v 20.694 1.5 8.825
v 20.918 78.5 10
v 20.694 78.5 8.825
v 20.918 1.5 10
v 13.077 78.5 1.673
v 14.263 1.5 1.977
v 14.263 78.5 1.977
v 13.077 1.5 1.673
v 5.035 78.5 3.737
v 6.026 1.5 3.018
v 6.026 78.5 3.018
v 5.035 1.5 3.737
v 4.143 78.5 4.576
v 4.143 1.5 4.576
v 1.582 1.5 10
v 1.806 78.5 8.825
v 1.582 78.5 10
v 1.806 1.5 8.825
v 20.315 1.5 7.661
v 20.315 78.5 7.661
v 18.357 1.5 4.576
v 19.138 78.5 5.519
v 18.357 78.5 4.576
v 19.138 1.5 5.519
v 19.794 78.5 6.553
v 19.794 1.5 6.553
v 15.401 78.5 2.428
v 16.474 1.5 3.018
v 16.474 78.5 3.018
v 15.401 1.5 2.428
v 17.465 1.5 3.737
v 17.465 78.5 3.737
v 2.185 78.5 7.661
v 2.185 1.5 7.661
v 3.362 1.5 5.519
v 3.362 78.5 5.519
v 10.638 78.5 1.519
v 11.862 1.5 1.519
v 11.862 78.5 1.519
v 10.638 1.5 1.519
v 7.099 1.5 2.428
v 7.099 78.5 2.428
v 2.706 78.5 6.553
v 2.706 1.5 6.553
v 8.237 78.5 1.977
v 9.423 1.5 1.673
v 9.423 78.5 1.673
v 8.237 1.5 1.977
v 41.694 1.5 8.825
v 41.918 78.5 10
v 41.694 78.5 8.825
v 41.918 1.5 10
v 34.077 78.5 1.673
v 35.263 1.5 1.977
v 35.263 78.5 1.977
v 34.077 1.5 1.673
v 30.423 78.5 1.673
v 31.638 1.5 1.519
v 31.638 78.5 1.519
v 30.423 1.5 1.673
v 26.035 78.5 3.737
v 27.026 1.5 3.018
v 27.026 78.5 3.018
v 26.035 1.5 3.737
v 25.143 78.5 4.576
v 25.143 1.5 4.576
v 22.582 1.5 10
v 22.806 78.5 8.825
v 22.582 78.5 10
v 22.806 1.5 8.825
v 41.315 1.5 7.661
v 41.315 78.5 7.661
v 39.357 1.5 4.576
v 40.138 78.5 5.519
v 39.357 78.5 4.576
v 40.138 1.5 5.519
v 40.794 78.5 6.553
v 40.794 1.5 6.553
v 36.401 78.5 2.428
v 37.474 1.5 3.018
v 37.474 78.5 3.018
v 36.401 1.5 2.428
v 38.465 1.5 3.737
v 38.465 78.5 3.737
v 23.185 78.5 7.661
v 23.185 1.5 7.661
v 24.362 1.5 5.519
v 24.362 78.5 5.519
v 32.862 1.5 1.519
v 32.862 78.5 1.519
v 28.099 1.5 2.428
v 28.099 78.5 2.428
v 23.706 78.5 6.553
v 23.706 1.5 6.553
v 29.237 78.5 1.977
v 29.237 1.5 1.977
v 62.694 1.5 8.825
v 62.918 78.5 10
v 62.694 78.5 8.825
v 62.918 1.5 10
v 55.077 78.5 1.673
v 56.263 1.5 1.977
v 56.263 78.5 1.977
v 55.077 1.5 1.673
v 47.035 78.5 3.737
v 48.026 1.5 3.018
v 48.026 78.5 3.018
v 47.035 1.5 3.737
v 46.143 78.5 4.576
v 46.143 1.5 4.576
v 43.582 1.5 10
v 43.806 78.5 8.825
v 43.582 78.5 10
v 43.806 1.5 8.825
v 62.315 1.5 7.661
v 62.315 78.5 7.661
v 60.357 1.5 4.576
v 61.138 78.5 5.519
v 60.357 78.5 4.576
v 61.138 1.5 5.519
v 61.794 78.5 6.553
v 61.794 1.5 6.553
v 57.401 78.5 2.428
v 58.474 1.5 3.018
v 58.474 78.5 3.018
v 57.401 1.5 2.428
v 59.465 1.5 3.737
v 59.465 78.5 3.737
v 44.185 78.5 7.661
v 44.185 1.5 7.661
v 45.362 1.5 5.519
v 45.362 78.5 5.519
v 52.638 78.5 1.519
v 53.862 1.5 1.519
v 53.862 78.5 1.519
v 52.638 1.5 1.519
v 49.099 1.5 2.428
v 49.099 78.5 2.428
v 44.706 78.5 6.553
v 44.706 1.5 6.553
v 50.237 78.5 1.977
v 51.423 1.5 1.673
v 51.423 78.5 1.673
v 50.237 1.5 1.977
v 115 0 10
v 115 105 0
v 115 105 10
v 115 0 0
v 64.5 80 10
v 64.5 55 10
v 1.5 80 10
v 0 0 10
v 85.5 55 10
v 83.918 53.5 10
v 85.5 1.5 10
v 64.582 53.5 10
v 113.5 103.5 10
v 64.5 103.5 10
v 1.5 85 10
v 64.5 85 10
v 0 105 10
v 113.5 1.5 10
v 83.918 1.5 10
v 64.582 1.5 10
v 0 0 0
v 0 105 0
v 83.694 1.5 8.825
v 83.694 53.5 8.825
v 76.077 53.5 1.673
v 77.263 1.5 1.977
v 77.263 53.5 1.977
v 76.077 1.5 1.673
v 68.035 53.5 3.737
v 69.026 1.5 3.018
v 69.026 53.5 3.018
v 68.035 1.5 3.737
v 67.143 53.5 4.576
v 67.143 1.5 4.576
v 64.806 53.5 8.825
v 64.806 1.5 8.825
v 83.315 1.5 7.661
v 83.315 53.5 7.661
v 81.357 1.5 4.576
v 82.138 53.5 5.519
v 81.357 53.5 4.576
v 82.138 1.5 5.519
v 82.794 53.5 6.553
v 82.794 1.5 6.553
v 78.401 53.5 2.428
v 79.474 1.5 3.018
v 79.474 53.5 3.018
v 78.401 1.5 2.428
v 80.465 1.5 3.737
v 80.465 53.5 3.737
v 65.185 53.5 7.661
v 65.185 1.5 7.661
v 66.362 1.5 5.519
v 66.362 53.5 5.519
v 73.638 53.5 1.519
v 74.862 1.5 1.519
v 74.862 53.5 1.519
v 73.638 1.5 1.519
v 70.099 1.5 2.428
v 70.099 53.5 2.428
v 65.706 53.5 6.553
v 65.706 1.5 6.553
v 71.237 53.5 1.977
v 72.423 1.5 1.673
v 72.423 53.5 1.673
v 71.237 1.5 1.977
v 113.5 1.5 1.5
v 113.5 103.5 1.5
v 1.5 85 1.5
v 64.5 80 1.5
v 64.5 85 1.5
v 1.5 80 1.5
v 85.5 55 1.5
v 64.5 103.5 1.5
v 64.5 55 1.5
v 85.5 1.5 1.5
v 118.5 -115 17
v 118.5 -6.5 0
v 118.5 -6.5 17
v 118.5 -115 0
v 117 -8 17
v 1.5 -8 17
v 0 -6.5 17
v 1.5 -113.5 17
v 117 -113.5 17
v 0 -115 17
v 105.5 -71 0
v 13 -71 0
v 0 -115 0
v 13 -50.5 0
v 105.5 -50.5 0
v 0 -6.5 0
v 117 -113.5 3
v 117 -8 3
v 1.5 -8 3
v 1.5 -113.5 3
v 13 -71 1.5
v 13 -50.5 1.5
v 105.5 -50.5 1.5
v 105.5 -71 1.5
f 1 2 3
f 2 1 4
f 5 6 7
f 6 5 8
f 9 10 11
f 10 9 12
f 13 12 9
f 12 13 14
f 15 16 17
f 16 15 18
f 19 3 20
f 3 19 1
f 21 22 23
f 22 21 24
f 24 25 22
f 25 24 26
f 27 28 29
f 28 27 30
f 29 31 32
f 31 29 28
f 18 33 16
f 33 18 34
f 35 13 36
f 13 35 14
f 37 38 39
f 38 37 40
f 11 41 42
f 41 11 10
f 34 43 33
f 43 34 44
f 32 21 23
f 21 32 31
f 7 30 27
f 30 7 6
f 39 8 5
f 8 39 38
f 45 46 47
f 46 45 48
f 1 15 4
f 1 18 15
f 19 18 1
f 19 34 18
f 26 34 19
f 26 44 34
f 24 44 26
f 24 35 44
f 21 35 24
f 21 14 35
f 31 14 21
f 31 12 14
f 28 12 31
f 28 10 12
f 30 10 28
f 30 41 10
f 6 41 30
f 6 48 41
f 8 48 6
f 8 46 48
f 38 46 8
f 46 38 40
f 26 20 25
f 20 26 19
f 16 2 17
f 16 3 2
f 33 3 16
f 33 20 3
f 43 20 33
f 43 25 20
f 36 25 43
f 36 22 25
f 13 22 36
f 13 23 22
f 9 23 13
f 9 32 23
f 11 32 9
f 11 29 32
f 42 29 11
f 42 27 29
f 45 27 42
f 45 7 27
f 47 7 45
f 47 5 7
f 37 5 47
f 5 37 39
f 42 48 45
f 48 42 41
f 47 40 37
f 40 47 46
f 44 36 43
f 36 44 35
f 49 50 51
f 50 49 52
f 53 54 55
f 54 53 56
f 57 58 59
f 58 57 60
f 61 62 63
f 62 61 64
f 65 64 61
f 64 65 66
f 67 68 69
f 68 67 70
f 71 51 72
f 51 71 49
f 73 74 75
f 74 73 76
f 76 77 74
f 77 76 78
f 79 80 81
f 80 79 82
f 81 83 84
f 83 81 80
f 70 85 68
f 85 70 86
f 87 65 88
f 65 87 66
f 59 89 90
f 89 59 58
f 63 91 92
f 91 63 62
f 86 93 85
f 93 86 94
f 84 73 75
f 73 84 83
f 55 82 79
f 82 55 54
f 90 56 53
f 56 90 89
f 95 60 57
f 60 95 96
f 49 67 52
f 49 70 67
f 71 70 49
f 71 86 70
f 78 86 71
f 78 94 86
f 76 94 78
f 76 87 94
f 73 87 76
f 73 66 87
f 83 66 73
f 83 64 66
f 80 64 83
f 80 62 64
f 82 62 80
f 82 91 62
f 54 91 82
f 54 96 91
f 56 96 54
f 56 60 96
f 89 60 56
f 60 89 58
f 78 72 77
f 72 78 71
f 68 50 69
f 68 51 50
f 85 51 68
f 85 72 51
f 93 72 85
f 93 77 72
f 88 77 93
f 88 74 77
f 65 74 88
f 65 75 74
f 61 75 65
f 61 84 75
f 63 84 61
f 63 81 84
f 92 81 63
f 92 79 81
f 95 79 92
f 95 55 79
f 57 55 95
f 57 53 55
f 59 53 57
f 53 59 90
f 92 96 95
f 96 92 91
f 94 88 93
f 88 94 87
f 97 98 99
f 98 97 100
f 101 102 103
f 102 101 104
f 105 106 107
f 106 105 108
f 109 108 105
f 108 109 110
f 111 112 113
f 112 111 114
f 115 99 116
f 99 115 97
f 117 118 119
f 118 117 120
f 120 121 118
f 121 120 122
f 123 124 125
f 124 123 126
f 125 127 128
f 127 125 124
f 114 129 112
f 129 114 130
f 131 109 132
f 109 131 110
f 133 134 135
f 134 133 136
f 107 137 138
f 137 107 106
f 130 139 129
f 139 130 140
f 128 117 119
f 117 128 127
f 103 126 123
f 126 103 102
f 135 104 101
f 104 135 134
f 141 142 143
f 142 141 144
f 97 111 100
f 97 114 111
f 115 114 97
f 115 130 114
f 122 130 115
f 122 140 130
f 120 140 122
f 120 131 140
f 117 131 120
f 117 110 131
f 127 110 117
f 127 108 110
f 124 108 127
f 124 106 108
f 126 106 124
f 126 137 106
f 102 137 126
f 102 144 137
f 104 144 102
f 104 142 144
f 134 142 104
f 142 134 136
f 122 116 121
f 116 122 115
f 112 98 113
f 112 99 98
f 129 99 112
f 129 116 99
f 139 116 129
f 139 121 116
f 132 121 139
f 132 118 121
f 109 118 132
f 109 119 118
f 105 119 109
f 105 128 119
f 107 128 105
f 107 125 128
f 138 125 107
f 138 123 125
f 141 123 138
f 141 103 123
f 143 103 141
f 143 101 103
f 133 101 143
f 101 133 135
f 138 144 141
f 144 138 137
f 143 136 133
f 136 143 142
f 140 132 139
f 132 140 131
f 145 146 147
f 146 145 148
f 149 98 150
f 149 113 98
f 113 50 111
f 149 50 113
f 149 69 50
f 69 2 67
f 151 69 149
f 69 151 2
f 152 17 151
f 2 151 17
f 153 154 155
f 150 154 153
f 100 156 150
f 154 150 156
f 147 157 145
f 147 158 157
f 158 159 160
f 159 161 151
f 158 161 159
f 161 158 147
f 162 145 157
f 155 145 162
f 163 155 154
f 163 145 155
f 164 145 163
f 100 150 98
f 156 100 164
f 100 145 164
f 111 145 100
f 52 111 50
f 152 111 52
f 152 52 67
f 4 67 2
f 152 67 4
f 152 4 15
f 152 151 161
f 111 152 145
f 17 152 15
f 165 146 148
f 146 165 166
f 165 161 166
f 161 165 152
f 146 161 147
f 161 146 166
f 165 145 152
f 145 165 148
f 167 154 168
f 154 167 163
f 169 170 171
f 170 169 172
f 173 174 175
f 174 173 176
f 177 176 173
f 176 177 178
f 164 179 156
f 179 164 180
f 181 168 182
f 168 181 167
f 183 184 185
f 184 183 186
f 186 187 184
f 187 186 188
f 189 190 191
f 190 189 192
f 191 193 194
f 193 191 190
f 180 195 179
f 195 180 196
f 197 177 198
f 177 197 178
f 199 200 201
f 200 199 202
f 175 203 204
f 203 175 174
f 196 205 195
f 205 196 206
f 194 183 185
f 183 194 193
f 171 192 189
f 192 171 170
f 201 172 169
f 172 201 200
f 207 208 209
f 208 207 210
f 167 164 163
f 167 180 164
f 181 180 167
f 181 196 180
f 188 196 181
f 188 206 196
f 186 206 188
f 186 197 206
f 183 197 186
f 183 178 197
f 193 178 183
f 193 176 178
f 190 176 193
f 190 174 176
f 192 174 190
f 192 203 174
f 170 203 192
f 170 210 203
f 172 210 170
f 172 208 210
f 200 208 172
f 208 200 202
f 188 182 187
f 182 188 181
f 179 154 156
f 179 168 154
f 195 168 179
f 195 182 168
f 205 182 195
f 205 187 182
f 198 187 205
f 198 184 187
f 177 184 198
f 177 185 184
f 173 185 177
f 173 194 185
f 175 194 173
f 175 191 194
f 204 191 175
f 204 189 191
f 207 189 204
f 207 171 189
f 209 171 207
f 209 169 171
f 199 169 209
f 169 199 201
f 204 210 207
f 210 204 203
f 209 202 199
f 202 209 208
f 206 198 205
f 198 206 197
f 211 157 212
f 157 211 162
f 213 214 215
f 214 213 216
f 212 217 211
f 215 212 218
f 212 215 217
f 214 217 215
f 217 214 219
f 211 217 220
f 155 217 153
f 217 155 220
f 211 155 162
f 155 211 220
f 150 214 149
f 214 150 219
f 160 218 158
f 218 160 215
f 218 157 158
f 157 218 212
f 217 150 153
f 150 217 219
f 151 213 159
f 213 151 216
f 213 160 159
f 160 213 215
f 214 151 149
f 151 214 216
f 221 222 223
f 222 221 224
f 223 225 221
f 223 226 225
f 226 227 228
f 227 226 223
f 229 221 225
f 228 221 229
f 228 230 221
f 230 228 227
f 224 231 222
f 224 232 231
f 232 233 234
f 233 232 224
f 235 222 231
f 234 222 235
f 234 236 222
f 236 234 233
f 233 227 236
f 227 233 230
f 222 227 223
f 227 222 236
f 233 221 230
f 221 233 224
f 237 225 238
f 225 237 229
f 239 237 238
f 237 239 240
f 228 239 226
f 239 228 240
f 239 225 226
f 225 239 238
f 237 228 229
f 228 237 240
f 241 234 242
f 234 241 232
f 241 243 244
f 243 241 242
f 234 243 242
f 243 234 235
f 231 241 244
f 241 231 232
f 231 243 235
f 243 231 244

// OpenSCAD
choke_len = 77.0;
choke_d = 19.5;
choke_space = 1.5;
choke_len2 = 52.0;

box_outer_l = 115.0;
box_outer_w = 105.0;
box_height = 10.0;
wall_thick = 1.5;
spacer = 0.25;

$fn = 50;

// ------ Choker Holder Bottom ----------
union(){
    difference(){
        cube([box_outer_l, box_outer_w, box_height], center = false);
        for (i = [0 : 2]){
            translate([wall_thick + choke_d / 2.0 + i * (choke_d + choke_space), 
                       wall_thick, 
                       wall_thick + choke_d / 2.0]){
                rotate([-90, 0, 0]) {
                    cylinder(h = choke_len, r = choke_d / 2.0, center = false);
                }
            }
        }
        translate([wall_thick + choke_d / 2.0 + 3 * (choke_d + choke_space), 
                   wall_thick, 
                   wall_thick + choke_d / 2.0]){
            rotate([-90, 0, 0]) {
                cylinder(h = choke_len2, r = choke_d / 2.0, center = false);
            }
        }
        left_square_bin = wall_thick + 4 * (choke_d + choke_space);
        translate([left_square_bin, 
                   wall_thick, 
                   wall_thick]){
            cube([box_outer_l - wall_thick - left_square_bin, 
                  choke_len2 + 5.0, 
                  choke_d], center = false);
        }
        left_square_bin2 = wall_thick + 3 * (choke_d + choke_space);
        translate([left_square_bin2, 
                   choke_len2 + 2*wall_thick, 
                   wall_thick]){
            cube([box_outer_l - wall_thick - left_square_bin2, 
                  box_outer_w - 3*wall_thick - choke_len2, 
                  choke_d], center = false);
        }
        translate([wall_thick,
                   2*wall_thick + choke_len,
                   wall_thick]) {
            cube([3*choke_d + 2*choke_space + 5.0, 
                  5.0, 
                  choke_d], center = false);
        }
    }
    translate([1.7 * choke_d, 
               choke_len + 2*wall_thick + 14.0, 
               box_height]) {
        resize([46, 10, .5]) 
            surface("c:/repositories/3d-modeling/beretta-png-logo-smaller.png", center = true, invert = false);
    }
}

offset_w = -115;
x_inset_border = 13.0;
y_inset_border = 44;

// ------ Box Top ----------
union() {
    difference(){
        translate([0, offset_w, 0]) {
            cube([box_outer_l + 2 * wall_thick + 2 * spacer,
                  box_outer_w + 2 * wall_thick + 2 * spacer,
                  box_height + 7.0], center = false);
        }
        translate([wall_thick, offset_w + wall_thick, 2*wall_thick]){
            cube([box_outer_l + 2 * spacer,
                  box_outer_w + 2 * spacer,
                  box_height + 10.0], center = false);
        }
        translate([x_inset_border, 
                   offset_w + box_outer_w + 2 * wall_thick + 2 * spacer - y_inset_border, 
                   wall_thick]) {
            rotate([180, 0, 0])
            cube([box_outer_l + 2 * wall_thick + 2 * spacer - 2 * x_inset_border, 
                  box_outer_w + 2 * wall_thick + 2 * spacer - 2 * y_inset_border, 
                  10], center = false);
        }
    }
    translate([(box_outer_l + 2 * wall_thick + 2 * spacer) / 2.0, 
                offset_w + (box_outer_w + 2*wall_thick + 2*spacer) / 2.0, 
                0]) {
        rotate([180, 0, 0])
        // pixels are 463 x 100
        resize([92.6, 20, wall_thick+0.5])
            surface("c:/repositories/3d-modeling/beretta-png-logo-smaller.png", 
                    center = true, invert = true);
    }
}
